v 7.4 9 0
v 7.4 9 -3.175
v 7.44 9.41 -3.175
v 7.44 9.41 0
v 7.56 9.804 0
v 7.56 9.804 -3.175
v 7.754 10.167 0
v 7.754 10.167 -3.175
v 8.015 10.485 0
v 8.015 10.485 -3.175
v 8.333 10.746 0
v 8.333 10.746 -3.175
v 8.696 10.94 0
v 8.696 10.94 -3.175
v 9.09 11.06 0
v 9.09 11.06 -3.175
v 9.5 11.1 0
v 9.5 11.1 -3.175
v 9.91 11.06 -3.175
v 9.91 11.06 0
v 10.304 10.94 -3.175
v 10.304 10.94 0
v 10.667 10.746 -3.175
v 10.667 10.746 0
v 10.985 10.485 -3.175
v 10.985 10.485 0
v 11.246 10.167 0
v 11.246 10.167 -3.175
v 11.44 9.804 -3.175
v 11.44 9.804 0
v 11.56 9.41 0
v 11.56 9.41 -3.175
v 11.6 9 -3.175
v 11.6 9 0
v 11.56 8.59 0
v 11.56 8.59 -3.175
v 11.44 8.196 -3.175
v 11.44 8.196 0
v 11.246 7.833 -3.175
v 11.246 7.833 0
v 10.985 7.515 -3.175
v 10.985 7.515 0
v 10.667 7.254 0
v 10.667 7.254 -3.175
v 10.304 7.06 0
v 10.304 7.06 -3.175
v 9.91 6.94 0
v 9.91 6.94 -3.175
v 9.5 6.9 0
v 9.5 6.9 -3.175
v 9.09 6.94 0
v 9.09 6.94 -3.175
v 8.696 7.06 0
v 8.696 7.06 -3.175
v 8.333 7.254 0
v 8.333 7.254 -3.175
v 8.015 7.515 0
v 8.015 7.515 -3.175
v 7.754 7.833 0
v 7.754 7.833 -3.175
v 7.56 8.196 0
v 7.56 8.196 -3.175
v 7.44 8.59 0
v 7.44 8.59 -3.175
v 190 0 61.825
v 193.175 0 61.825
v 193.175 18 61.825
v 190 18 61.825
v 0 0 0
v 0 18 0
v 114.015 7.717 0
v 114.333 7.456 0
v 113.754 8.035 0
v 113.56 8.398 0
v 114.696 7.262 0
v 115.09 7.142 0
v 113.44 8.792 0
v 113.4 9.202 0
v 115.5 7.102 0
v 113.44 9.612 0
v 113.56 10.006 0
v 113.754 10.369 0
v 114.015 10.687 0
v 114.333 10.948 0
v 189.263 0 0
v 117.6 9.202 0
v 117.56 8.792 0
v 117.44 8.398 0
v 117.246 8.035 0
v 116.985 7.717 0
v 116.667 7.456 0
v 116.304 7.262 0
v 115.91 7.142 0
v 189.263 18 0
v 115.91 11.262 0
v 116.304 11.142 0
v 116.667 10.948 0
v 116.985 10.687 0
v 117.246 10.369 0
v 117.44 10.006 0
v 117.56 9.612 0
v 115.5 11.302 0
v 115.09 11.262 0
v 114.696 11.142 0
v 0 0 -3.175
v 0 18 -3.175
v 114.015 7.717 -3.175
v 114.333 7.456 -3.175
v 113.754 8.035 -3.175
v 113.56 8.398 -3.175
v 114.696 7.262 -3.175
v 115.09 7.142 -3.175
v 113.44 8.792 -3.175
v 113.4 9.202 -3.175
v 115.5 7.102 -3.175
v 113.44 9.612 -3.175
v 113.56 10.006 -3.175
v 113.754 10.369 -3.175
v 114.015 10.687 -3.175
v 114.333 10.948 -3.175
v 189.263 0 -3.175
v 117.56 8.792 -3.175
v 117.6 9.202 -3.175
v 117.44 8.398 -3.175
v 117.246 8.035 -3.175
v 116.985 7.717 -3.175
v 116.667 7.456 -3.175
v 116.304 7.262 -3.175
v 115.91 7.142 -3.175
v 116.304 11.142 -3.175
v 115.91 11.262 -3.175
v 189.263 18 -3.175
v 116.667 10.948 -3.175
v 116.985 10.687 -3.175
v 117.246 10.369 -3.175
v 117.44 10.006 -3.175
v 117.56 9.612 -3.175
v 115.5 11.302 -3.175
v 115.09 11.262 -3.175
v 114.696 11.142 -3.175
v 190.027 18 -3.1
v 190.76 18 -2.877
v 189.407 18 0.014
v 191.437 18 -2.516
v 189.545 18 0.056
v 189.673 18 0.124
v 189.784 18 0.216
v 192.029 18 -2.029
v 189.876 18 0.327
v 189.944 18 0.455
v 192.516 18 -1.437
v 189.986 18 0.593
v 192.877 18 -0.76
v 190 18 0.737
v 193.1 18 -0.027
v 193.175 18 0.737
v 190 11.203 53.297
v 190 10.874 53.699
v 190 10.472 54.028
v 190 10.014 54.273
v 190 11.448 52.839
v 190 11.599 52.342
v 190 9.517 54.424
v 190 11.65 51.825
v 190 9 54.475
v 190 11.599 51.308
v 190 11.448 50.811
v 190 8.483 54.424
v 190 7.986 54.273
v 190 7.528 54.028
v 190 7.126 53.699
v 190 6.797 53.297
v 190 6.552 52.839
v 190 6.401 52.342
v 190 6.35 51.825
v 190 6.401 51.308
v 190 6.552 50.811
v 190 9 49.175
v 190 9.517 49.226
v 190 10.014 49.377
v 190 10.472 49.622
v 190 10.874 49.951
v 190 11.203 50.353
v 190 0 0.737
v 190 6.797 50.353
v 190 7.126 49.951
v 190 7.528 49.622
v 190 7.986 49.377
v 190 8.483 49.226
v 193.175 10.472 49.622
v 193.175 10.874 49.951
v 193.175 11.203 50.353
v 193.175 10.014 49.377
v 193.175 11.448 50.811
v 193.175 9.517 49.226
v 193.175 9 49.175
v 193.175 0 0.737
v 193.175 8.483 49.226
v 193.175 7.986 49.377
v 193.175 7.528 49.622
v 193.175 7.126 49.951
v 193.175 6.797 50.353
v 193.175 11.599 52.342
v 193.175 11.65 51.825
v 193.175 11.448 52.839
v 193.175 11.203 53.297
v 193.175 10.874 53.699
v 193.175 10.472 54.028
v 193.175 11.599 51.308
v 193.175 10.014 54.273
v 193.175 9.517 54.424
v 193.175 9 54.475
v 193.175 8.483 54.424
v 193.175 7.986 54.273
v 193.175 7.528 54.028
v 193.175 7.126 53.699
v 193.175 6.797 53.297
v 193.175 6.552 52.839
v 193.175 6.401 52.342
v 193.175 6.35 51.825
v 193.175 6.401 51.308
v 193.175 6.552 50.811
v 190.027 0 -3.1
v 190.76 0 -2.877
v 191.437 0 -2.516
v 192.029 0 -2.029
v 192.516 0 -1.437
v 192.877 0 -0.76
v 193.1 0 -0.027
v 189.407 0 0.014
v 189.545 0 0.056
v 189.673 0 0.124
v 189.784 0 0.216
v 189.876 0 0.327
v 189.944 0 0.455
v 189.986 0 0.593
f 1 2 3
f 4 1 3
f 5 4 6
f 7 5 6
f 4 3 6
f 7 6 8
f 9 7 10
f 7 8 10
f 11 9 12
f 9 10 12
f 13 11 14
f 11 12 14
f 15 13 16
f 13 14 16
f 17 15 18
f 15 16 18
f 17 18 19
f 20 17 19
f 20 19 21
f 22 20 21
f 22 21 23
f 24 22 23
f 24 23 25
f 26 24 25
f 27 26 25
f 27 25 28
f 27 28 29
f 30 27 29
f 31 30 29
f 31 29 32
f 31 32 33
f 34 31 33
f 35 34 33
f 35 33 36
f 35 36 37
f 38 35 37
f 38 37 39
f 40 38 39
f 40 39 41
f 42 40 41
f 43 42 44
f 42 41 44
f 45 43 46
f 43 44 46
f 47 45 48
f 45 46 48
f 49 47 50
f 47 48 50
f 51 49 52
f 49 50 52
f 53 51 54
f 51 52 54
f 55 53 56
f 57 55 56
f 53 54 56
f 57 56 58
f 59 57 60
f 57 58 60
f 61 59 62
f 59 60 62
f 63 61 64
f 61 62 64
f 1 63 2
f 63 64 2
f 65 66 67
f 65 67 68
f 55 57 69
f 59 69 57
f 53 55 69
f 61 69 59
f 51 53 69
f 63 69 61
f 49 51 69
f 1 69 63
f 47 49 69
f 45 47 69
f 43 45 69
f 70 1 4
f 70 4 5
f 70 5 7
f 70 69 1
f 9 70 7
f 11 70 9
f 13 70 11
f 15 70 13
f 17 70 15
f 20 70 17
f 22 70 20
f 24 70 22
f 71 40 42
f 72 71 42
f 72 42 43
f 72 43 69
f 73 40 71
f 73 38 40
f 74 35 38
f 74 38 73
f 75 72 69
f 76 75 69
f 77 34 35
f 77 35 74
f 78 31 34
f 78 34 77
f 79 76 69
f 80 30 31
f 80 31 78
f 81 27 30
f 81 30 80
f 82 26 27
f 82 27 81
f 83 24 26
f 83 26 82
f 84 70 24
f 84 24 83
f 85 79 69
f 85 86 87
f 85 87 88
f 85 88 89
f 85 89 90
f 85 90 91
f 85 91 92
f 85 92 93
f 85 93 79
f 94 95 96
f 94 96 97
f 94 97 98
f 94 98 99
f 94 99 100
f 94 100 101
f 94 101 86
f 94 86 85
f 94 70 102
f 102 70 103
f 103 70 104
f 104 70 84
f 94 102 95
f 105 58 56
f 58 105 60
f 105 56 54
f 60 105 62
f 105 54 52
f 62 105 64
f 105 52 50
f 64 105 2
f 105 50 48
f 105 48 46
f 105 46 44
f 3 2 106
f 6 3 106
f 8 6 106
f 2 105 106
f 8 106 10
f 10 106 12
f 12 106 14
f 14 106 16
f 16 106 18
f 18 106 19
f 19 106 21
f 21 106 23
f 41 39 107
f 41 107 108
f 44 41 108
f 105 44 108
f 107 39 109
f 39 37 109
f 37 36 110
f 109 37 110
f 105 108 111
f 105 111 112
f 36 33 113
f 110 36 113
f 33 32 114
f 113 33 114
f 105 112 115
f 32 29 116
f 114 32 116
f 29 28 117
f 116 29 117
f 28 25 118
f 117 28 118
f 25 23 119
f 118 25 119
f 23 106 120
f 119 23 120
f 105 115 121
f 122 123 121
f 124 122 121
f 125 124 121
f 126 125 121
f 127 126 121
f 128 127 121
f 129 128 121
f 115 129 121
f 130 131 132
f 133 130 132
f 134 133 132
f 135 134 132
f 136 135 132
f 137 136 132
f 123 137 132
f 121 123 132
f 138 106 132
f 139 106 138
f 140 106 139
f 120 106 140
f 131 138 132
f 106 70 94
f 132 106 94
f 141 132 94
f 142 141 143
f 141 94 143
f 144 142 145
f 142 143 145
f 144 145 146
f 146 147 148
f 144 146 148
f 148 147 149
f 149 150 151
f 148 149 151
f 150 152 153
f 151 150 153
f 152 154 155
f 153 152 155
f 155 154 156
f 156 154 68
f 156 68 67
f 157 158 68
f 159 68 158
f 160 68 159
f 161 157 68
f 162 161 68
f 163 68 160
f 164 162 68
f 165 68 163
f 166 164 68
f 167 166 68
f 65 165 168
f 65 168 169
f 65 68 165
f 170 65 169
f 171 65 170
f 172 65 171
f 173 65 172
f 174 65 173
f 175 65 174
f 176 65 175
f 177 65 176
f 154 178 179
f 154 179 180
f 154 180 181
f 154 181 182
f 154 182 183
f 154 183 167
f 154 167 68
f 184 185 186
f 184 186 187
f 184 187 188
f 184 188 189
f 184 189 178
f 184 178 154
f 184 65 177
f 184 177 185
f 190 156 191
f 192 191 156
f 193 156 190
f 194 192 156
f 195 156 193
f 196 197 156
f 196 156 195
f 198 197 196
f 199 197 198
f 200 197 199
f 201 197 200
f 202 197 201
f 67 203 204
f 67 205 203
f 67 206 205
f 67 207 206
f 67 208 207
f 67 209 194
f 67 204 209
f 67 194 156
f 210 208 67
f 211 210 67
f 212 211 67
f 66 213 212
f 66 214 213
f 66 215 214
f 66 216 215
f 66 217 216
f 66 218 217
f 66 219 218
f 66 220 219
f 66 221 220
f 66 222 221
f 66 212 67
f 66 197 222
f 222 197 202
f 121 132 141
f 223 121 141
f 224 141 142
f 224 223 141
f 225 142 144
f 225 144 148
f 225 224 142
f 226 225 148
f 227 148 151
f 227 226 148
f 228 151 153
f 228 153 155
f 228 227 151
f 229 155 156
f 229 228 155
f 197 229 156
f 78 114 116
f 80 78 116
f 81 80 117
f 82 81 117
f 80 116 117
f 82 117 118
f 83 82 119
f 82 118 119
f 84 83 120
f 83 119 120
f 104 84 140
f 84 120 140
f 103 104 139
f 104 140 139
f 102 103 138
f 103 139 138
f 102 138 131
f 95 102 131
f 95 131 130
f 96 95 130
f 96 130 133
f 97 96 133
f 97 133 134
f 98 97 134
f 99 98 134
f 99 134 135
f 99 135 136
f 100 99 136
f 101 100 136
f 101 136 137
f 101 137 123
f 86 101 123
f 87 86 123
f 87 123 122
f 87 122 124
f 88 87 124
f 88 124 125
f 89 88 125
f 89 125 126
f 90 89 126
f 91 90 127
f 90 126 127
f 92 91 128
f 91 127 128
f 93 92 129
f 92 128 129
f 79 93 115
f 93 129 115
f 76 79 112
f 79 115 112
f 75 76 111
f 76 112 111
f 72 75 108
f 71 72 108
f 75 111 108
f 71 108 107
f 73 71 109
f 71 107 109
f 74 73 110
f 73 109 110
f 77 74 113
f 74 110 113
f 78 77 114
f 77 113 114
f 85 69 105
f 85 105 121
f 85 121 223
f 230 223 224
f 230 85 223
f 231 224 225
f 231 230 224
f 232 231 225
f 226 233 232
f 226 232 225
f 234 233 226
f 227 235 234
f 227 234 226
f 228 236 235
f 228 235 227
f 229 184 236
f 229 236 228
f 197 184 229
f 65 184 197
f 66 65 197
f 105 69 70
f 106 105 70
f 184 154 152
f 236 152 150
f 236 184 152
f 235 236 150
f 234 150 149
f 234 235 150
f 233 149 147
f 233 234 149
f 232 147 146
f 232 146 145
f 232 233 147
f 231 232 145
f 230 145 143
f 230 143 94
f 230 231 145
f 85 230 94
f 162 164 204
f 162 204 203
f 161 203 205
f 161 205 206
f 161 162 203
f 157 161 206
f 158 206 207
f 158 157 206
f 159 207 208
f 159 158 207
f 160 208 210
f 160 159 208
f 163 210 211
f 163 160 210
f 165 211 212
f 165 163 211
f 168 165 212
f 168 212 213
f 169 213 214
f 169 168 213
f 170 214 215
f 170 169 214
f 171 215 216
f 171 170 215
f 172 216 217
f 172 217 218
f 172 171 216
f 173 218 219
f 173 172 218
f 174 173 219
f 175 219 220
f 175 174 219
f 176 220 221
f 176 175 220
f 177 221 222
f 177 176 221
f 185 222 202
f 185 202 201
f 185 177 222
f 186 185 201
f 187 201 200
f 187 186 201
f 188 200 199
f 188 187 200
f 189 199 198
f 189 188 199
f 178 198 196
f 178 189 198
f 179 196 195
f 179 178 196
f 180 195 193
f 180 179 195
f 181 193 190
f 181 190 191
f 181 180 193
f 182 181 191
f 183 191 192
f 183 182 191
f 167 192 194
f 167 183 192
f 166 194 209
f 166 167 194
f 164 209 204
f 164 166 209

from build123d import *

# Parameters (mm, degrees)
SKETCH7_W                    = 190
SKETCH7_H                    = 18
BASE_FLANGE2_DEPTH           = 3.175
EDGE_FLANGE1_STRIP_W         = 14.1732
EDGE_FLANGE1_STRIP_H         = 3.175
EDGE_FLANGE1_STRIP_CUT_DEPTH = 18
EDGE_FLANGE1_DEPTH           = 18
M5X0_8_TAPPED_HOLE2_D        = 4.2
HOLE1_START                  = 190
HOLE1_OUTLINE_R              = 2.65
HOLE1_DEPTH                  = 3.175


# Read off the part's stored shape, not the designer's step: Hole1
# Sheet-metal steps are written as plain solids
with BuildPart() as part:
    # Sketch7 → Base-Flange2 (new body)
    with BuildSketch(Plane.XY):
        with Locations((95, 9)):
            Rectangle(SKETCH7_W, SKETCH7_H)
    extrude(amount=-BASE_FLANGE2_DEPTH)

    # Edge-Flange1 strip (across the edge) → Edge-Flange1 strip cut (cut)
    with BuildSketch(Plane(origin=(190, 0, 0), x_dir=(-1, 0, 0), z_dir=(0, 1, 0))):
        with Locations((-6.35, -1.5875)):
            Rectangle(EDGE_FLANGE1_STRIP_W, EDGE_FLANGE1_STRIP_H)
    extrude(amount=EDGE_FLANGE1_STRIP_CUT_DEPTH, mode=Mode.SUBTRACT)

    # Edge-Flange1 section (across the edge) → Edge-Flange1 (add)
    with BuildSketch(Plane(origin=(190, 0, 0), x_dir=(-1, 0, 0), z_dir=(0, 1, 0))):
        with BuildLine():
            Line((-3.175, 0.7366), (-3.175, 61.825))
            Line((-3.175, 61.825), (0, 61.825))
            Line((0, 61.825), (0, 0.7366))
            ThreePointArc((0, 0.7366), (0.215745145, 0.215745145), (0.7366, 0))
            Line((0.7366, 0), (0.7366, -3.175))
            ThreePointArc((0.7366, -3.175), (-2.029318885, -2.029318885), (-3.175, 0.7366))
        make_face()
    extrude(amount=EDGE_FLANGE1_DEPTH)

    # M5x0.8 Tapped Hole2 (through all)
    with Locations(Plane.XY):
        with Locations((9.5, 9), (115.5, 9.202035326)):
            Hole(M5X0_8_TAPPED_HOLE2_D / 2)

    # Hole1 outline → Hole1 (cut)
    with BuildSketch(Plane.YZ.offset(HOLE1_START)):
        with Locations((9, 51.825)):
            Circle(HOLE1_OUTLINE_R)
    extrude(amount=HOLE1_DEPTH, mode=Mode.SUBTRACT)


solid = part.part
